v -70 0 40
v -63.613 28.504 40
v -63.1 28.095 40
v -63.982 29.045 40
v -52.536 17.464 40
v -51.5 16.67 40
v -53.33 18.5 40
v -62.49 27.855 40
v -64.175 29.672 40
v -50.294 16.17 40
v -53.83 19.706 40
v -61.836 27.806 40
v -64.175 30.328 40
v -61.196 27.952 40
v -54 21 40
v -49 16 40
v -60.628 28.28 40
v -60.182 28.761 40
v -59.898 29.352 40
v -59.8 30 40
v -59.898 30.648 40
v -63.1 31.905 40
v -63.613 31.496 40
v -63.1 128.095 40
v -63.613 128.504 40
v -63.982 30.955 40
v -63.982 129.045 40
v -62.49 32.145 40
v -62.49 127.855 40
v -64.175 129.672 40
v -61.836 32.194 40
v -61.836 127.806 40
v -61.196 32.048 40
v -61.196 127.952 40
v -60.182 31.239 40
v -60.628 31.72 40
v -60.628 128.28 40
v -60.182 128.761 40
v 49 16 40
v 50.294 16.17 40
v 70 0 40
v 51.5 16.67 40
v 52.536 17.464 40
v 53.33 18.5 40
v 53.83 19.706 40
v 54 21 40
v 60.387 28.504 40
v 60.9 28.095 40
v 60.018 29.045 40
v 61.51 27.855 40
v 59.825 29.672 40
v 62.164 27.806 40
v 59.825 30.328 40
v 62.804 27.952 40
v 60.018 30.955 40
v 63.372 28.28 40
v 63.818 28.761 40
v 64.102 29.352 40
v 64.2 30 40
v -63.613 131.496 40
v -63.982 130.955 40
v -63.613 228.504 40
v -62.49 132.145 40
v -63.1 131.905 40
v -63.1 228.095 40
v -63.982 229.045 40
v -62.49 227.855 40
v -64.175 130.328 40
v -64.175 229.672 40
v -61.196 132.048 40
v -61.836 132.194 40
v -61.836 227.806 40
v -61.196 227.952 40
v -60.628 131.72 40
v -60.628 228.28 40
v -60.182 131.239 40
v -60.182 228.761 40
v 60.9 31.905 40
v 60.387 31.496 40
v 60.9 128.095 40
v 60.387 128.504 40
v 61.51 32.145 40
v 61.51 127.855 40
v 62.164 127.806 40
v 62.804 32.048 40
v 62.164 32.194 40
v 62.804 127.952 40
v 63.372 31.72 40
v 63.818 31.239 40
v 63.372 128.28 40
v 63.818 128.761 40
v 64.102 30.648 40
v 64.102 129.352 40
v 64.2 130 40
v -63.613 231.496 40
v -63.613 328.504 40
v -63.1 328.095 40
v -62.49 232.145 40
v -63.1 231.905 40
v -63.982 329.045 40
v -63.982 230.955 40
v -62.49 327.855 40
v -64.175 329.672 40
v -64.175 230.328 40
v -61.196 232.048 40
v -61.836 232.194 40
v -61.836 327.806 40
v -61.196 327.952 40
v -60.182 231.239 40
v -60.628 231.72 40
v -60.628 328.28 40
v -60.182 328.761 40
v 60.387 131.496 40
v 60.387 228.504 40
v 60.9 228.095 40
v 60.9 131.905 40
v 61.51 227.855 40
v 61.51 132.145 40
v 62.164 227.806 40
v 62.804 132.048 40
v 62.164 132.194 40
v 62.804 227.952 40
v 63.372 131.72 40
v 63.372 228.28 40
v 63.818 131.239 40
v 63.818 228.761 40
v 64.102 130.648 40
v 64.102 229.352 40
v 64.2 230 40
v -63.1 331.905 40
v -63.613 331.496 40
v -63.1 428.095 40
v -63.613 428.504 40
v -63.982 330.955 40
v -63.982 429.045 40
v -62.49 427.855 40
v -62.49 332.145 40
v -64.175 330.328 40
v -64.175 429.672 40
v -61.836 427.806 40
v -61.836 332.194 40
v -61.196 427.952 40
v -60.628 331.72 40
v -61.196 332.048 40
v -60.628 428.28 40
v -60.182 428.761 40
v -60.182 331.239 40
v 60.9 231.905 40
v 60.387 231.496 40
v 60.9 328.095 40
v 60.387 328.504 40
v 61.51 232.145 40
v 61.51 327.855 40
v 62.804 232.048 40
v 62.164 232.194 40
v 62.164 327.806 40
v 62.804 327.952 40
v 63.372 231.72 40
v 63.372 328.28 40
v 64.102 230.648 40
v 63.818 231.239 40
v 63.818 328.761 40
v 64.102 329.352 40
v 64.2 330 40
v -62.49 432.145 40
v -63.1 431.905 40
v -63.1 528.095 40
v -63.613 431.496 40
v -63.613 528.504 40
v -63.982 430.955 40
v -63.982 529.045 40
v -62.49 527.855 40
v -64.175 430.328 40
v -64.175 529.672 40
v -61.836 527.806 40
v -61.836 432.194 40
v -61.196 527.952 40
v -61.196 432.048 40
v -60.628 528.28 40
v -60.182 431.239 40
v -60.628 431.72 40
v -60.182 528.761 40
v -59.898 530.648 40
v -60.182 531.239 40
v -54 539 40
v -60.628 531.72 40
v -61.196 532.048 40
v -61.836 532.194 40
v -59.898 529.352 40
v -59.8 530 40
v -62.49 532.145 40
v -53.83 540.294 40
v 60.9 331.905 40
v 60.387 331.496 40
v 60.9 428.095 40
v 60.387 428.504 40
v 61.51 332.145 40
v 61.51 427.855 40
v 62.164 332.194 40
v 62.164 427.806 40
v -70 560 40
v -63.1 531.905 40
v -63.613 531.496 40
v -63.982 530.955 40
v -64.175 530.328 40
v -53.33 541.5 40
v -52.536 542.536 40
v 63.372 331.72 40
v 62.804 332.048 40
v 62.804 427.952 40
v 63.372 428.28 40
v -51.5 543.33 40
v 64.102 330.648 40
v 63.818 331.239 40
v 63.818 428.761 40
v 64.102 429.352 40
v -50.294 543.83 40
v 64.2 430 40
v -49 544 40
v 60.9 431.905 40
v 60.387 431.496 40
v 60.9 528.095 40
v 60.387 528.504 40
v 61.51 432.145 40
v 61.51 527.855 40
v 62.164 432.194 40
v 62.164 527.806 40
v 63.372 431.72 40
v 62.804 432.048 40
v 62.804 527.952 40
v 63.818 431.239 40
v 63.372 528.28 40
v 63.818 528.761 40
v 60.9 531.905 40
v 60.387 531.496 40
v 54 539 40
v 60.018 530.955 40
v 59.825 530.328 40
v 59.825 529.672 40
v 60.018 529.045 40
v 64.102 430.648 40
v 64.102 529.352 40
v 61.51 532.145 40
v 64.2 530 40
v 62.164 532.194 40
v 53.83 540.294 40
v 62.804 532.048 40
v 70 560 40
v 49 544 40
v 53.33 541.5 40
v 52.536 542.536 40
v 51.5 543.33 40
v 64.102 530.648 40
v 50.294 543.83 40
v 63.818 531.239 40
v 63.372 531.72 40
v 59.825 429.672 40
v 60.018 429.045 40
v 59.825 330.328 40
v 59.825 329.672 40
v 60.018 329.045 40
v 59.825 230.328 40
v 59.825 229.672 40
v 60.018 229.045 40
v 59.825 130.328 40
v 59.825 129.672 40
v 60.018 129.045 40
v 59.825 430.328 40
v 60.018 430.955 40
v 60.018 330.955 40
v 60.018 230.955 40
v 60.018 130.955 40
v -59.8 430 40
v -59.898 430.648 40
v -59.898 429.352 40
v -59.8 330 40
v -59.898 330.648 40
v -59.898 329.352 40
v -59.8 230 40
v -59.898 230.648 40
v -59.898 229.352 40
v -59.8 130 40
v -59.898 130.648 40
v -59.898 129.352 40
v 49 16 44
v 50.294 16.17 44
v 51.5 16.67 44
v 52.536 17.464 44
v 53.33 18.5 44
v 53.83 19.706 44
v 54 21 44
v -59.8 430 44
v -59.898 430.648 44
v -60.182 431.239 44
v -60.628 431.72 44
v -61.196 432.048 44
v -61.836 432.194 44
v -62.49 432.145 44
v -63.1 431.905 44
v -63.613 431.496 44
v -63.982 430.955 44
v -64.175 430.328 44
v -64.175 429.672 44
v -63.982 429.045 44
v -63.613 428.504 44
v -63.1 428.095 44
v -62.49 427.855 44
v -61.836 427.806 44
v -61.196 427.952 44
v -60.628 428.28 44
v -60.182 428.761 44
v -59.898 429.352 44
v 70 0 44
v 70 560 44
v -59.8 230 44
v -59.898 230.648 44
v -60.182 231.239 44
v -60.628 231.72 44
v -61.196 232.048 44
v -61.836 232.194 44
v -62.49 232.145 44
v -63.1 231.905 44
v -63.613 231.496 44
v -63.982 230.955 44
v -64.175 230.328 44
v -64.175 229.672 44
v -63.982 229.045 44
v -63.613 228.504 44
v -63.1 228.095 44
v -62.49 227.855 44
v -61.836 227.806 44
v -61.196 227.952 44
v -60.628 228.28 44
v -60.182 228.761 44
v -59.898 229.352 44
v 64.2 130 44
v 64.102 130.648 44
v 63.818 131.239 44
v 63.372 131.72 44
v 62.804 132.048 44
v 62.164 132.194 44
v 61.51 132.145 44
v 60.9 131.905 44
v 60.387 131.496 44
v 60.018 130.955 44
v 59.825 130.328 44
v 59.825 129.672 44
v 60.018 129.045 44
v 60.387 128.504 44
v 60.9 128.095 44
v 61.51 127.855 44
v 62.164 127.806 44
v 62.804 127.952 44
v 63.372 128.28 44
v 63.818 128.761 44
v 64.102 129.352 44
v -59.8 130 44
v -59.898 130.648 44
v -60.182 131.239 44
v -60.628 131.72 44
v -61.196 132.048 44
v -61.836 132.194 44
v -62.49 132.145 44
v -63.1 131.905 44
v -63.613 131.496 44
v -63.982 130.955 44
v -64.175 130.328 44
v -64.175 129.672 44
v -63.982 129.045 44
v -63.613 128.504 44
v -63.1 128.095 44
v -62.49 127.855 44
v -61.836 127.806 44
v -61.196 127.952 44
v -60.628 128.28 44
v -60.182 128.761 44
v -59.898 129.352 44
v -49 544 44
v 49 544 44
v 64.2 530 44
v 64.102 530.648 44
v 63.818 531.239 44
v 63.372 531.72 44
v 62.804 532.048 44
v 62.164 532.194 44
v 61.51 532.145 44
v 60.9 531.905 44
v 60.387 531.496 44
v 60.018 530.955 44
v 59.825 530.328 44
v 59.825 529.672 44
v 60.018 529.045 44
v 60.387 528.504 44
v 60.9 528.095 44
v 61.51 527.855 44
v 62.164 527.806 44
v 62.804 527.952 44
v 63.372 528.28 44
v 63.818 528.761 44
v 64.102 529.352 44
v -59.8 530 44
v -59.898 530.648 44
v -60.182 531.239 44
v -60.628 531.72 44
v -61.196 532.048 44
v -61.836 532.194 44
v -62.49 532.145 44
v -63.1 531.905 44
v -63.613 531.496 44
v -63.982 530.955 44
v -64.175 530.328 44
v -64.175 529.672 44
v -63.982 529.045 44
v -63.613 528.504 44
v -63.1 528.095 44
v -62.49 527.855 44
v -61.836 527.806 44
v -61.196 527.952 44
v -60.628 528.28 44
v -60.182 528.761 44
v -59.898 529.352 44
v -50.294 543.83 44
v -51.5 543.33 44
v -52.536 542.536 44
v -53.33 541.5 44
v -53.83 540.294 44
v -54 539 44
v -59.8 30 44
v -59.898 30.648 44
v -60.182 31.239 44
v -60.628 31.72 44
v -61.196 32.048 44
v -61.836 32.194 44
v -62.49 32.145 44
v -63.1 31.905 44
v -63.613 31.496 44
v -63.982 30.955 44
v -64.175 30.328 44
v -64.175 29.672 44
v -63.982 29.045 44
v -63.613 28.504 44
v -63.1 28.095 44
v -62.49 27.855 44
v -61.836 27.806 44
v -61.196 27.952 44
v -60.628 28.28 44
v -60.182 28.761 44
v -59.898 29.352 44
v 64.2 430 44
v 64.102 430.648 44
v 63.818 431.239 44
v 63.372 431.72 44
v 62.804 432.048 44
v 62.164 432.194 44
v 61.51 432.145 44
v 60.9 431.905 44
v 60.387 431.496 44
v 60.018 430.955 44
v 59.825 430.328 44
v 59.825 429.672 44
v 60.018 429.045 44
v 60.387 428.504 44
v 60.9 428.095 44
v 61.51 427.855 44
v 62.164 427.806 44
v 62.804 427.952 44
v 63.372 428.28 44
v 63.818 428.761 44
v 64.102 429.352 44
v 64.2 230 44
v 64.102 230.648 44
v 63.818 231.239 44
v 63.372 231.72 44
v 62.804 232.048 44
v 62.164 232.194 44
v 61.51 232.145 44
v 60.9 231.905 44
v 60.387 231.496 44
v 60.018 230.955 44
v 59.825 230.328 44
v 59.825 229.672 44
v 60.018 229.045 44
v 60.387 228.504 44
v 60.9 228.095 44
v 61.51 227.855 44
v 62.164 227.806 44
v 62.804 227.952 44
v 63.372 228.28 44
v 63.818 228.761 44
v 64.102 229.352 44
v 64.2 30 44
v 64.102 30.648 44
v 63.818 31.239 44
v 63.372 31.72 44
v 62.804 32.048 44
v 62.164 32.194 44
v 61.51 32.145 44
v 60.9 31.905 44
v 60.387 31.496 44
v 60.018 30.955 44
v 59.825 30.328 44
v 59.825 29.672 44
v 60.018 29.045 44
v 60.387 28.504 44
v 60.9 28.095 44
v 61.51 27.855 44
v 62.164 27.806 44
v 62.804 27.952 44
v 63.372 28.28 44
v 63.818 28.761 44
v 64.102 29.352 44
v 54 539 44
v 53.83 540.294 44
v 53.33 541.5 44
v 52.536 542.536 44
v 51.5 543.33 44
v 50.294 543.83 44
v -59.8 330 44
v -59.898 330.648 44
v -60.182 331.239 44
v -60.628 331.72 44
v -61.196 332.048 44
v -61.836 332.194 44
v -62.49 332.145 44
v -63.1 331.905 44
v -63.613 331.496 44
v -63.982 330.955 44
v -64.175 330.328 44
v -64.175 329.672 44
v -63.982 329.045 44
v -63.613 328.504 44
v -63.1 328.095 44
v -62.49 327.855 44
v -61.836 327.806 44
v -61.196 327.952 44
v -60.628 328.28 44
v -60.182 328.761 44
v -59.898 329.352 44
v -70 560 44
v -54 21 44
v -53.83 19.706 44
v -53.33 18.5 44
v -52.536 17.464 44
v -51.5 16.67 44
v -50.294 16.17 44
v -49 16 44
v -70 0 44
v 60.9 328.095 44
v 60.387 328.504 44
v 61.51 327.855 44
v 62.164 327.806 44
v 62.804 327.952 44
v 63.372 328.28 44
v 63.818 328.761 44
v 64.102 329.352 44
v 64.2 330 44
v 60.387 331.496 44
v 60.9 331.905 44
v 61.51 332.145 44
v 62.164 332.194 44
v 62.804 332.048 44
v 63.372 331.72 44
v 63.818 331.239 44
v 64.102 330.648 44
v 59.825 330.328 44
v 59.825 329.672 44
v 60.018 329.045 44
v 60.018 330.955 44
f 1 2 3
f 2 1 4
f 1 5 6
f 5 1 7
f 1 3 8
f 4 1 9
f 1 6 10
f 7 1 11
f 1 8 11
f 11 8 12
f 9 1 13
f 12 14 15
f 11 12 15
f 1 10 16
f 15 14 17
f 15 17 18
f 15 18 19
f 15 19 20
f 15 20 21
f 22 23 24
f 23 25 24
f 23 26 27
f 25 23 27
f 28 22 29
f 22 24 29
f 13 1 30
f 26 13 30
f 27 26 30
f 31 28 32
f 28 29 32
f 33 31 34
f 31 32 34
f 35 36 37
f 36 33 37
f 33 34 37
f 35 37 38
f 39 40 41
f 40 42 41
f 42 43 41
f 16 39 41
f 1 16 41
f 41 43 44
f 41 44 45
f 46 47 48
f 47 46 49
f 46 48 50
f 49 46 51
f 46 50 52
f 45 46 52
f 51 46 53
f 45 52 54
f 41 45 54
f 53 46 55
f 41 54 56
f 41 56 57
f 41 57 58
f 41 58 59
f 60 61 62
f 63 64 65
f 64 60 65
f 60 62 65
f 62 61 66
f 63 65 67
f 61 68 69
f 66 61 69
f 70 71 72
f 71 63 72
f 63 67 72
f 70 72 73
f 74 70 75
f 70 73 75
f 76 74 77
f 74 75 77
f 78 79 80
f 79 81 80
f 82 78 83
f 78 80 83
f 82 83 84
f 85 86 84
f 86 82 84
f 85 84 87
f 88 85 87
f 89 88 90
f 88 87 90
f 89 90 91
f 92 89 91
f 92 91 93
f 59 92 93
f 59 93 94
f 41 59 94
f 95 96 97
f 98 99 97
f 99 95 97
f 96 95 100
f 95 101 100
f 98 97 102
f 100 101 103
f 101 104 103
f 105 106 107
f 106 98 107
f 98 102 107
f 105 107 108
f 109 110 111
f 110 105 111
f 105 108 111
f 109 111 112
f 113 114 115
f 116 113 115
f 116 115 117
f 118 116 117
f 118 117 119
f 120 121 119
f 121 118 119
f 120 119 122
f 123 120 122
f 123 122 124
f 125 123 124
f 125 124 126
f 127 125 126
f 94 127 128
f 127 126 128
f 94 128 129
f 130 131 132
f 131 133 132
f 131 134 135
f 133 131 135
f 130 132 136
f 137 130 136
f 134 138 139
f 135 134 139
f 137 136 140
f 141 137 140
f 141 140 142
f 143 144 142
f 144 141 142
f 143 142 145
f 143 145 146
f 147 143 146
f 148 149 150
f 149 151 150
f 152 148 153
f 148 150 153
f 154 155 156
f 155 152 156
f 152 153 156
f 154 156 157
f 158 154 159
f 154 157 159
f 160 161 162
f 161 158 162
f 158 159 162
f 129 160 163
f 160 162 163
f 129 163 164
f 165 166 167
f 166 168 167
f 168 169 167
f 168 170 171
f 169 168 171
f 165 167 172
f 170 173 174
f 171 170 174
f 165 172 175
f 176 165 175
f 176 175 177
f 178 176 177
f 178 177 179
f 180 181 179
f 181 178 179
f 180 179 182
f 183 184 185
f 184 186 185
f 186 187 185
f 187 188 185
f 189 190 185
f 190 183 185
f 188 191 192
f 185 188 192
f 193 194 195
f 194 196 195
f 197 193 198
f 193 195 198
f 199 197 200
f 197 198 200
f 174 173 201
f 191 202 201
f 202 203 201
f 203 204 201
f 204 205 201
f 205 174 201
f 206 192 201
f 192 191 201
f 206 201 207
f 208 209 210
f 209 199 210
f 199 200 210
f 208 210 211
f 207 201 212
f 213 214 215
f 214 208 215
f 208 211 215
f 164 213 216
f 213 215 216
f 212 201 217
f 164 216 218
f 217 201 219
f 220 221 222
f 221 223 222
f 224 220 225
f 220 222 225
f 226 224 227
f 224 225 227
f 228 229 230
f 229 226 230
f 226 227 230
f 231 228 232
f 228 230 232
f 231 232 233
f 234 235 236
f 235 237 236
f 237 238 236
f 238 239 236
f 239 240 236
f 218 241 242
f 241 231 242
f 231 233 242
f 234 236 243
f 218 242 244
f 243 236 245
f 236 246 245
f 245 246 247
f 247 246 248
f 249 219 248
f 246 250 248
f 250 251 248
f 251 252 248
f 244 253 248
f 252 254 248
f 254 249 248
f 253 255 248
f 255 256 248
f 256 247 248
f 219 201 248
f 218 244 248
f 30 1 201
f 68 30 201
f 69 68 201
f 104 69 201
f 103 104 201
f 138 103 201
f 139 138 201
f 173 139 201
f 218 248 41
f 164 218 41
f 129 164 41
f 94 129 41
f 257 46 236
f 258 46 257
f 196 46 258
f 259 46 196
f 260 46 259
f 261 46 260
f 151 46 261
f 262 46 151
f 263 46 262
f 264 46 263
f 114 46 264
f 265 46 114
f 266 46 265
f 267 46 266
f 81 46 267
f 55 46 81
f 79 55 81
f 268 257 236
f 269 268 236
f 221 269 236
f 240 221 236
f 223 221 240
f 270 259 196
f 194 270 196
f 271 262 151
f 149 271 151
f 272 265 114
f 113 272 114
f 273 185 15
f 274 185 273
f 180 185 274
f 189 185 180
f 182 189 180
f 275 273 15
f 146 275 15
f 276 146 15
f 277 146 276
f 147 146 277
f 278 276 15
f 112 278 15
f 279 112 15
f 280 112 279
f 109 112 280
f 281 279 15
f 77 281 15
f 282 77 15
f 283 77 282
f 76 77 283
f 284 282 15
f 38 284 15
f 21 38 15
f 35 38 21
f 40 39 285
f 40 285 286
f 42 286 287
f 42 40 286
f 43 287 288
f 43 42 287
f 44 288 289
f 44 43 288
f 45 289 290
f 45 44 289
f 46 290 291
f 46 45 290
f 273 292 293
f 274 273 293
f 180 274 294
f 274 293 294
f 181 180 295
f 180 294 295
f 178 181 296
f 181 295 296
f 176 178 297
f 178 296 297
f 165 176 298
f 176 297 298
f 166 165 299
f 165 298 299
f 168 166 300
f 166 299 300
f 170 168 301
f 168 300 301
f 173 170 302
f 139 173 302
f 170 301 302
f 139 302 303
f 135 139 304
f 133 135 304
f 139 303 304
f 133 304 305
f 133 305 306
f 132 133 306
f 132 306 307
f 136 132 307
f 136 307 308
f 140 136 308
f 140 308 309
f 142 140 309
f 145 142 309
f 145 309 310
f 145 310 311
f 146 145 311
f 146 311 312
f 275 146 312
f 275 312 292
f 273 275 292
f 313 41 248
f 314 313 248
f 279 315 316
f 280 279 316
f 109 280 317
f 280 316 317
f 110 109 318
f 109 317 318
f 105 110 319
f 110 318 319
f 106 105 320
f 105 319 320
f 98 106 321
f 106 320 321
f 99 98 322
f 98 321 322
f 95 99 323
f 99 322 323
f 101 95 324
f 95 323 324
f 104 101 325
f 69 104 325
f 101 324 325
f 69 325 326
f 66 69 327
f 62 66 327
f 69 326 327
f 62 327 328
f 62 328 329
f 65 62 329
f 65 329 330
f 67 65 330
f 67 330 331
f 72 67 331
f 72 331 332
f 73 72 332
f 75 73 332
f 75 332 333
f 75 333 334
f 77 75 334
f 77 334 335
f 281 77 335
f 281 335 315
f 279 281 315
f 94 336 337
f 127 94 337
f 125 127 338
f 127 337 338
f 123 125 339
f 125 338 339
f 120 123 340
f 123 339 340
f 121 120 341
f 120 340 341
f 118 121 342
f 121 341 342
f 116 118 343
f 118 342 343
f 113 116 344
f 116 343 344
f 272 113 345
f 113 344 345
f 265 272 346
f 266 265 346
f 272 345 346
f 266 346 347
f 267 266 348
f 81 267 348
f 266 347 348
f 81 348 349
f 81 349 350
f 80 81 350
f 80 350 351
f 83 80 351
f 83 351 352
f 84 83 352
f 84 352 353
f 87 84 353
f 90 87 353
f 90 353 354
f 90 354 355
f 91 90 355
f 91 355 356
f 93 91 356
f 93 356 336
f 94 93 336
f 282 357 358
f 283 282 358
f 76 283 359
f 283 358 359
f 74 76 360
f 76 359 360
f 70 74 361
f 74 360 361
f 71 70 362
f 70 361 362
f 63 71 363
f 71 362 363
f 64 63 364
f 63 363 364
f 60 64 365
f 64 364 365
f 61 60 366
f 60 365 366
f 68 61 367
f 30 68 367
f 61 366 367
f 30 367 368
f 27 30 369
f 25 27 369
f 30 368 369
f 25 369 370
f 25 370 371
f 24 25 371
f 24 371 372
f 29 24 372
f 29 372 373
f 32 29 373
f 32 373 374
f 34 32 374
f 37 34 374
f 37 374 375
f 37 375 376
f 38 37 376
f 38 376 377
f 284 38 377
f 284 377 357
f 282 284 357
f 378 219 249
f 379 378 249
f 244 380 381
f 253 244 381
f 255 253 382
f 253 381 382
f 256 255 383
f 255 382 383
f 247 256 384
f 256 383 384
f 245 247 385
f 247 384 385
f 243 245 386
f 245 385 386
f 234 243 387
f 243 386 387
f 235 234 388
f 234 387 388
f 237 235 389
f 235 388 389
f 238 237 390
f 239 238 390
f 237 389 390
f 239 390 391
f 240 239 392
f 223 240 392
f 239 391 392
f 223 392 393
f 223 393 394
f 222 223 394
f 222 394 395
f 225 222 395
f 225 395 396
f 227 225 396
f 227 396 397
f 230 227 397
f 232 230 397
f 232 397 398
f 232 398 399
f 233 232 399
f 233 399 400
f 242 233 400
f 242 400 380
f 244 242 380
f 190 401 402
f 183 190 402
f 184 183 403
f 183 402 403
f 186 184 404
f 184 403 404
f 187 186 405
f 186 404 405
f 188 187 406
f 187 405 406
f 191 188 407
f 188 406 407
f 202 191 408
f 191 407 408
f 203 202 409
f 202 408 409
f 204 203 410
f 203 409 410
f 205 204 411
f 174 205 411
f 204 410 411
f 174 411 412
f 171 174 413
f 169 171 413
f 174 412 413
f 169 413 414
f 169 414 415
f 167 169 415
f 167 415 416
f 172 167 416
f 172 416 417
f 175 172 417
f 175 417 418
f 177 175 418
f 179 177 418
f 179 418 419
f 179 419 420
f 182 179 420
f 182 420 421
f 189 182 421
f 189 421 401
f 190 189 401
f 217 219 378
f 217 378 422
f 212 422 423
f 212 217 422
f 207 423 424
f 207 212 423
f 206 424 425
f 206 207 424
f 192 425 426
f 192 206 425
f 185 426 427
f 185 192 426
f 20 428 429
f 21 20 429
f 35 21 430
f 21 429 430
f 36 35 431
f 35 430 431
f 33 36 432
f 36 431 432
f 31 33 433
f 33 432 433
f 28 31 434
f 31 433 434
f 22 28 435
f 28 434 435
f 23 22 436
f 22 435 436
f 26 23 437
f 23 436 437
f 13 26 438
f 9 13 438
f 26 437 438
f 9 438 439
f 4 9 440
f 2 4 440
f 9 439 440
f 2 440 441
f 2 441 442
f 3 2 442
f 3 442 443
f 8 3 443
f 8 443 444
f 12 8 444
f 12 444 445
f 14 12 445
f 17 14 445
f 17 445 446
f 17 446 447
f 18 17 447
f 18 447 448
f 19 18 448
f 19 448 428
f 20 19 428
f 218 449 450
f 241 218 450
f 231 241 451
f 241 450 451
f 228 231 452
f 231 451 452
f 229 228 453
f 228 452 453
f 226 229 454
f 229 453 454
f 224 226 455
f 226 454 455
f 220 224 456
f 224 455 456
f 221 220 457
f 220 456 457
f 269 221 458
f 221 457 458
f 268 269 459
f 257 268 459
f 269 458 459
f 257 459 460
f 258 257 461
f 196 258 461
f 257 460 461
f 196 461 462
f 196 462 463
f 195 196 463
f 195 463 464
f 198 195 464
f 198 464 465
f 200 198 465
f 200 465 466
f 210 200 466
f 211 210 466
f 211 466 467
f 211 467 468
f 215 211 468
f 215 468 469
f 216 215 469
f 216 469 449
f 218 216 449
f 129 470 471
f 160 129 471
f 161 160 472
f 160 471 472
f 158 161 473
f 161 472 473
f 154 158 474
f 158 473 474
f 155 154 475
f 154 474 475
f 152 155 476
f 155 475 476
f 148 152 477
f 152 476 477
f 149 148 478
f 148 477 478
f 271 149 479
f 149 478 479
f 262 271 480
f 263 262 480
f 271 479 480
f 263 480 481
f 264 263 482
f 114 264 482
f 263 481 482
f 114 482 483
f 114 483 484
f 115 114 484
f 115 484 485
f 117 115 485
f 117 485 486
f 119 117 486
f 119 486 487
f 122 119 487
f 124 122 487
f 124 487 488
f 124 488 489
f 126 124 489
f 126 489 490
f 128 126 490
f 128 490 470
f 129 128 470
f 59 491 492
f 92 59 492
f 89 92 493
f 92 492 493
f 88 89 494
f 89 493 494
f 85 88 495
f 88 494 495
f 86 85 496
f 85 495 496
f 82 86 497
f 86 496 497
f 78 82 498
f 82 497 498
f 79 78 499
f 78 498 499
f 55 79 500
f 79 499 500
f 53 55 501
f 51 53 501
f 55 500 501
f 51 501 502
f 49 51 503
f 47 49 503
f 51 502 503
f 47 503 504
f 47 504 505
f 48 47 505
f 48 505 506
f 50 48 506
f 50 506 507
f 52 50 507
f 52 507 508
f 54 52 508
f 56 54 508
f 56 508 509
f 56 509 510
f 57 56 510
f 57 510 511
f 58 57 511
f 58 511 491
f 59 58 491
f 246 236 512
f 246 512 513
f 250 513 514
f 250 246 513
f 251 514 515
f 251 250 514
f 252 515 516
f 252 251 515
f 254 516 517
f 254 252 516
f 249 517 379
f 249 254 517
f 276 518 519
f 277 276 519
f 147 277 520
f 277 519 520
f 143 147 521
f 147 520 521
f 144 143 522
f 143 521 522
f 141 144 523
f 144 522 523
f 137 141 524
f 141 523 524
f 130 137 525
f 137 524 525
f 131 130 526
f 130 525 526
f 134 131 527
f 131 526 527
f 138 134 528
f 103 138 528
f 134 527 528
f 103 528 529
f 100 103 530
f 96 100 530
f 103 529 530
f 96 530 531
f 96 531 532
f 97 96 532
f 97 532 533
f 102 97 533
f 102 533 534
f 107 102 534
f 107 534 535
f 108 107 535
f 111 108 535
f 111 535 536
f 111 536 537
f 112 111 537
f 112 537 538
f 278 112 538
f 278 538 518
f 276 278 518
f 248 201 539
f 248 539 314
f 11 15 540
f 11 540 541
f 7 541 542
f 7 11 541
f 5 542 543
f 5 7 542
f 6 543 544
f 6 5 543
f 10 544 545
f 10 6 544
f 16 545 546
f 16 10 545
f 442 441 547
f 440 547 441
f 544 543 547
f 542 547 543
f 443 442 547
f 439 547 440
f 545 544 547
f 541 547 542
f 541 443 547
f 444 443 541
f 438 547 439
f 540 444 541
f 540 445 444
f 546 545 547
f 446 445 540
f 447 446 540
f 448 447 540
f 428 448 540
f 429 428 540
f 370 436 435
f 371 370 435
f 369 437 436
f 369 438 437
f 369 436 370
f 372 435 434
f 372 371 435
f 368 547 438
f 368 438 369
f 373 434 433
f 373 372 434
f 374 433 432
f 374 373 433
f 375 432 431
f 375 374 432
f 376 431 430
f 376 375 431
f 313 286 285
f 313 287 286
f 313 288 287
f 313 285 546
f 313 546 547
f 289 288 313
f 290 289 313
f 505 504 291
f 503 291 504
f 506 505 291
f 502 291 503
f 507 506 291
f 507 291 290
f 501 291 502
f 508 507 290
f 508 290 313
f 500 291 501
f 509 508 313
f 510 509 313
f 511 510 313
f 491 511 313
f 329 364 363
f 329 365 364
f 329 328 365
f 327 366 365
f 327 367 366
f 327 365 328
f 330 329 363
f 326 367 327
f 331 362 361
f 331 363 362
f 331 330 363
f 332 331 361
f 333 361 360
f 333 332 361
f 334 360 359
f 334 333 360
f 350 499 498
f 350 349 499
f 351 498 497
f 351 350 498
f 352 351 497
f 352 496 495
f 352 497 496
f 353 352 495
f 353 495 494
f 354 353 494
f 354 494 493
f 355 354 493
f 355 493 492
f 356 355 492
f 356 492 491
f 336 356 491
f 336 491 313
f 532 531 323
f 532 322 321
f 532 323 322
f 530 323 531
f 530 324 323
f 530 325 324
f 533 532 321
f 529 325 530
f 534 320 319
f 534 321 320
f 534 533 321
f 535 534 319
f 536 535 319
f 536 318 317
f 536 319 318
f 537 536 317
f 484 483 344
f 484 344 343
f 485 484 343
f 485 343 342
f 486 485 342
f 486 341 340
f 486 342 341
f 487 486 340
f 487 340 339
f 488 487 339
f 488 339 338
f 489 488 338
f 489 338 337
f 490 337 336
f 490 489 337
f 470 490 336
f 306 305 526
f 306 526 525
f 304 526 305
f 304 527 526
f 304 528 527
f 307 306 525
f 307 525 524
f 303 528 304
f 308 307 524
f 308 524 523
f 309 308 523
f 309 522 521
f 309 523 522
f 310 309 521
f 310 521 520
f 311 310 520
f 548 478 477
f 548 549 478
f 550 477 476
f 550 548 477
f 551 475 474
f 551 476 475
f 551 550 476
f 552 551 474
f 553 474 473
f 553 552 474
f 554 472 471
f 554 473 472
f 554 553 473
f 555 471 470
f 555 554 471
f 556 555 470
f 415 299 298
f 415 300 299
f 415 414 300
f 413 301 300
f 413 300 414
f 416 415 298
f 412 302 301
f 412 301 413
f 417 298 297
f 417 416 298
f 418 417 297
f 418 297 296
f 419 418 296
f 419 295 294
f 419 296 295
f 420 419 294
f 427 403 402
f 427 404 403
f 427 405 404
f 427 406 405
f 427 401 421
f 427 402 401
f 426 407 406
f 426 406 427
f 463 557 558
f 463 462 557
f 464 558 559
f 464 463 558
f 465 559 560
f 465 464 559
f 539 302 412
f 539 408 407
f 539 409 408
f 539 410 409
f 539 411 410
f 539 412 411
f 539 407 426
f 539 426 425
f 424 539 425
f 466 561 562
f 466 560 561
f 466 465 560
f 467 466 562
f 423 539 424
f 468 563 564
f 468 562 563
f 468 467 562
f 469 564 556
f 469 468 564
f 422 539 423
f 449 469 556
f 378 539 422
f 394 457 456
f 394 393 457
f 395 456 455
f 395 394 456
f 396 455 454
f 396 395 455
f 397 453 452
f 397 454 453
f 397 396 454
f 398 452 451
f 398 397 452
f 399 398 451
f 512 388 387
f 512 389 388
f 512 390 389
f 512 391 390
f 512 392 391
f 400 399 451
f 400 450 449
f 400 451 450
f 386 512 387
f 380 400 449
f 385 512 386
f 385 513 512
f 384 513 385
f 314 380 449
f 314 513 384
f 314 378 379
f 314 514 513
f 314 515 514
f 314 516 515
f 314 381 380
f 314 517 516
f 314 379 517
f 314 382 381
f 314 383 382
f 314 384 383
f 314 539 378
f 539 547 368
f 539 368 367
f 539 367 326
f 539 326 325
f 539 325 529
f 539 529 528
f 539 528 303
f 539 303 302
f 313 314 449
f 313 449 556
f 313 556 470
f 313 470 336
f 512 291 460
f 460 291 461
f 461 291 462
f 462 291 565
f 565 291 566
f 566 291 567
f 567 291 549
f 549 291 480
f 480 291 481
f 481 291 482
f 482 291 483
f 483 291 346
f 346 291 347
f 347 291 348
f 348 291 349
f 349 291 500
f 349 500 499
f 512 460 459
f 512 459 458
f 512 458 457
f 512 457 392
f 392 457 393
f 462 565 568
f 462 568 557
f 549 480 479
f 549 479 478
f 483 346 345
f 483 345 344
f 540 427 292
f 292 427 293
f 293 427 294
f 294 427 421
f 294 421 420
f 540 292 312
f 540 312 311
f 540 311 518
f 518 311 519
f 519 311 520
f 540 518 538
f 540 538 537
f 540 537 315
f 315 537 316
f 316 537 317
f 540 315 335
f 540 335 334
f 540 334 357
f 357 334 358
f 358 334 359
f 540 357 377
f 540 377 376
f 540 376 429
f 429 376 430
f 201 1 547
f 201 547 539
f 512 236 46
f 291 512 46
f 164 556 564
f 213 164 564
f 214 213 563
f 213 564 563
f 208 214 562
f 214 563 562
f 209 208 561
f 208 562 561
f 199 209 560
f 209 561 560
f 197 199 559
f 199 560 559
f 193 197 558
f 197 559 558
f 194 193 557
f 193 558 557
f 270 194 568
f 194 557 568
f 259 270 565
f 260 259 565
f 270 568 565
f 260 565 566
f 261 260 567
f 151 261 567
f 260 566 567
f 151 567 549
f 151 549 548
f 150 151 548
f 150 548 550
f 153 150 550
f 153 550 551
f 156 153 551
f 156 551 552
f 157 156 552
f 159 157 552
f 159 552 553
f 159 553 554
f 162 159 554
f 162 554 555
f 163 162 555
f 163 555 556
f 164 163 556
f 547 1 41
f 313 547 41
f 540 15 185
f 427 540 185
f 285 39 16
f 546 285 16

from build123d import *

# Parameters (mm, degrees)
SKETCH002_W            = 140
SKETCH002_H            = 560
PAD001_DEPTH           = 4
SKETCH003_R            = 2.2
POCKET001_DEPTH        = 4.001
LINEARPATTERN001_COUNT = 6
LINEARPATTERN001_PITCH = 100


with BuildPart() as part:
    # Sketch002 → Pad001 (new body)
    with BuildSketch(Plane.XY):
        with Locations((0, 280)):
            Rectangle(SKETCH002_W, SKETCH002_H)
        with BuildLine():
            Line((-49, 544), (49, 544))
            ThreePointArc((54, 539), (52.535534, 542.535534), (49, 544))
            Line((54, 539), (54, 21))
            ThreePointArc((49, 16), (52.535534, 17.464466), (54, 21))
            Line((49, 16), (-49, 16))
            ThreePointArc((-54, 21), (-52.535534, 17.464466), (-49, 16))
            Line((-54, 21), (-54, 539))
            ThreePointArc((-49, 544), (-52.535534, 542.535534), (-54, 539))
        make_face(mode=Mode.SUBTRACT)
    extrude(amount=PAD001_DEPTH)

    # Sketch003 (on Face14 of Pad001) → Pocket001 (cut, through all)
    with BuildSketch(Plane.XY.offset(4)):
        with Locations((62, 30)):
            Circle(SKETCH003_R)
        with Locations((-62, 30)):
            Circle(SKETCH003_R)
    pocket001 = extrude(amount=-POCKET001_DEPTH, mode=Mode.SUBTRACT)

    # LinearPattern001: Pocket001 ×6
    with Locations(*[(0, i * LINEARPATTERN001_PITCH, 0) for i in range(1, LINEARPATTERN001_COUNT)]):
        add(pocket001, mode=Mode.SUBTRACT)


with BuildPart() as part_1:
    # Body001 placement: moved
    add(part.part.moved(Location((0, 0, 40))))


solid = part_1.part
